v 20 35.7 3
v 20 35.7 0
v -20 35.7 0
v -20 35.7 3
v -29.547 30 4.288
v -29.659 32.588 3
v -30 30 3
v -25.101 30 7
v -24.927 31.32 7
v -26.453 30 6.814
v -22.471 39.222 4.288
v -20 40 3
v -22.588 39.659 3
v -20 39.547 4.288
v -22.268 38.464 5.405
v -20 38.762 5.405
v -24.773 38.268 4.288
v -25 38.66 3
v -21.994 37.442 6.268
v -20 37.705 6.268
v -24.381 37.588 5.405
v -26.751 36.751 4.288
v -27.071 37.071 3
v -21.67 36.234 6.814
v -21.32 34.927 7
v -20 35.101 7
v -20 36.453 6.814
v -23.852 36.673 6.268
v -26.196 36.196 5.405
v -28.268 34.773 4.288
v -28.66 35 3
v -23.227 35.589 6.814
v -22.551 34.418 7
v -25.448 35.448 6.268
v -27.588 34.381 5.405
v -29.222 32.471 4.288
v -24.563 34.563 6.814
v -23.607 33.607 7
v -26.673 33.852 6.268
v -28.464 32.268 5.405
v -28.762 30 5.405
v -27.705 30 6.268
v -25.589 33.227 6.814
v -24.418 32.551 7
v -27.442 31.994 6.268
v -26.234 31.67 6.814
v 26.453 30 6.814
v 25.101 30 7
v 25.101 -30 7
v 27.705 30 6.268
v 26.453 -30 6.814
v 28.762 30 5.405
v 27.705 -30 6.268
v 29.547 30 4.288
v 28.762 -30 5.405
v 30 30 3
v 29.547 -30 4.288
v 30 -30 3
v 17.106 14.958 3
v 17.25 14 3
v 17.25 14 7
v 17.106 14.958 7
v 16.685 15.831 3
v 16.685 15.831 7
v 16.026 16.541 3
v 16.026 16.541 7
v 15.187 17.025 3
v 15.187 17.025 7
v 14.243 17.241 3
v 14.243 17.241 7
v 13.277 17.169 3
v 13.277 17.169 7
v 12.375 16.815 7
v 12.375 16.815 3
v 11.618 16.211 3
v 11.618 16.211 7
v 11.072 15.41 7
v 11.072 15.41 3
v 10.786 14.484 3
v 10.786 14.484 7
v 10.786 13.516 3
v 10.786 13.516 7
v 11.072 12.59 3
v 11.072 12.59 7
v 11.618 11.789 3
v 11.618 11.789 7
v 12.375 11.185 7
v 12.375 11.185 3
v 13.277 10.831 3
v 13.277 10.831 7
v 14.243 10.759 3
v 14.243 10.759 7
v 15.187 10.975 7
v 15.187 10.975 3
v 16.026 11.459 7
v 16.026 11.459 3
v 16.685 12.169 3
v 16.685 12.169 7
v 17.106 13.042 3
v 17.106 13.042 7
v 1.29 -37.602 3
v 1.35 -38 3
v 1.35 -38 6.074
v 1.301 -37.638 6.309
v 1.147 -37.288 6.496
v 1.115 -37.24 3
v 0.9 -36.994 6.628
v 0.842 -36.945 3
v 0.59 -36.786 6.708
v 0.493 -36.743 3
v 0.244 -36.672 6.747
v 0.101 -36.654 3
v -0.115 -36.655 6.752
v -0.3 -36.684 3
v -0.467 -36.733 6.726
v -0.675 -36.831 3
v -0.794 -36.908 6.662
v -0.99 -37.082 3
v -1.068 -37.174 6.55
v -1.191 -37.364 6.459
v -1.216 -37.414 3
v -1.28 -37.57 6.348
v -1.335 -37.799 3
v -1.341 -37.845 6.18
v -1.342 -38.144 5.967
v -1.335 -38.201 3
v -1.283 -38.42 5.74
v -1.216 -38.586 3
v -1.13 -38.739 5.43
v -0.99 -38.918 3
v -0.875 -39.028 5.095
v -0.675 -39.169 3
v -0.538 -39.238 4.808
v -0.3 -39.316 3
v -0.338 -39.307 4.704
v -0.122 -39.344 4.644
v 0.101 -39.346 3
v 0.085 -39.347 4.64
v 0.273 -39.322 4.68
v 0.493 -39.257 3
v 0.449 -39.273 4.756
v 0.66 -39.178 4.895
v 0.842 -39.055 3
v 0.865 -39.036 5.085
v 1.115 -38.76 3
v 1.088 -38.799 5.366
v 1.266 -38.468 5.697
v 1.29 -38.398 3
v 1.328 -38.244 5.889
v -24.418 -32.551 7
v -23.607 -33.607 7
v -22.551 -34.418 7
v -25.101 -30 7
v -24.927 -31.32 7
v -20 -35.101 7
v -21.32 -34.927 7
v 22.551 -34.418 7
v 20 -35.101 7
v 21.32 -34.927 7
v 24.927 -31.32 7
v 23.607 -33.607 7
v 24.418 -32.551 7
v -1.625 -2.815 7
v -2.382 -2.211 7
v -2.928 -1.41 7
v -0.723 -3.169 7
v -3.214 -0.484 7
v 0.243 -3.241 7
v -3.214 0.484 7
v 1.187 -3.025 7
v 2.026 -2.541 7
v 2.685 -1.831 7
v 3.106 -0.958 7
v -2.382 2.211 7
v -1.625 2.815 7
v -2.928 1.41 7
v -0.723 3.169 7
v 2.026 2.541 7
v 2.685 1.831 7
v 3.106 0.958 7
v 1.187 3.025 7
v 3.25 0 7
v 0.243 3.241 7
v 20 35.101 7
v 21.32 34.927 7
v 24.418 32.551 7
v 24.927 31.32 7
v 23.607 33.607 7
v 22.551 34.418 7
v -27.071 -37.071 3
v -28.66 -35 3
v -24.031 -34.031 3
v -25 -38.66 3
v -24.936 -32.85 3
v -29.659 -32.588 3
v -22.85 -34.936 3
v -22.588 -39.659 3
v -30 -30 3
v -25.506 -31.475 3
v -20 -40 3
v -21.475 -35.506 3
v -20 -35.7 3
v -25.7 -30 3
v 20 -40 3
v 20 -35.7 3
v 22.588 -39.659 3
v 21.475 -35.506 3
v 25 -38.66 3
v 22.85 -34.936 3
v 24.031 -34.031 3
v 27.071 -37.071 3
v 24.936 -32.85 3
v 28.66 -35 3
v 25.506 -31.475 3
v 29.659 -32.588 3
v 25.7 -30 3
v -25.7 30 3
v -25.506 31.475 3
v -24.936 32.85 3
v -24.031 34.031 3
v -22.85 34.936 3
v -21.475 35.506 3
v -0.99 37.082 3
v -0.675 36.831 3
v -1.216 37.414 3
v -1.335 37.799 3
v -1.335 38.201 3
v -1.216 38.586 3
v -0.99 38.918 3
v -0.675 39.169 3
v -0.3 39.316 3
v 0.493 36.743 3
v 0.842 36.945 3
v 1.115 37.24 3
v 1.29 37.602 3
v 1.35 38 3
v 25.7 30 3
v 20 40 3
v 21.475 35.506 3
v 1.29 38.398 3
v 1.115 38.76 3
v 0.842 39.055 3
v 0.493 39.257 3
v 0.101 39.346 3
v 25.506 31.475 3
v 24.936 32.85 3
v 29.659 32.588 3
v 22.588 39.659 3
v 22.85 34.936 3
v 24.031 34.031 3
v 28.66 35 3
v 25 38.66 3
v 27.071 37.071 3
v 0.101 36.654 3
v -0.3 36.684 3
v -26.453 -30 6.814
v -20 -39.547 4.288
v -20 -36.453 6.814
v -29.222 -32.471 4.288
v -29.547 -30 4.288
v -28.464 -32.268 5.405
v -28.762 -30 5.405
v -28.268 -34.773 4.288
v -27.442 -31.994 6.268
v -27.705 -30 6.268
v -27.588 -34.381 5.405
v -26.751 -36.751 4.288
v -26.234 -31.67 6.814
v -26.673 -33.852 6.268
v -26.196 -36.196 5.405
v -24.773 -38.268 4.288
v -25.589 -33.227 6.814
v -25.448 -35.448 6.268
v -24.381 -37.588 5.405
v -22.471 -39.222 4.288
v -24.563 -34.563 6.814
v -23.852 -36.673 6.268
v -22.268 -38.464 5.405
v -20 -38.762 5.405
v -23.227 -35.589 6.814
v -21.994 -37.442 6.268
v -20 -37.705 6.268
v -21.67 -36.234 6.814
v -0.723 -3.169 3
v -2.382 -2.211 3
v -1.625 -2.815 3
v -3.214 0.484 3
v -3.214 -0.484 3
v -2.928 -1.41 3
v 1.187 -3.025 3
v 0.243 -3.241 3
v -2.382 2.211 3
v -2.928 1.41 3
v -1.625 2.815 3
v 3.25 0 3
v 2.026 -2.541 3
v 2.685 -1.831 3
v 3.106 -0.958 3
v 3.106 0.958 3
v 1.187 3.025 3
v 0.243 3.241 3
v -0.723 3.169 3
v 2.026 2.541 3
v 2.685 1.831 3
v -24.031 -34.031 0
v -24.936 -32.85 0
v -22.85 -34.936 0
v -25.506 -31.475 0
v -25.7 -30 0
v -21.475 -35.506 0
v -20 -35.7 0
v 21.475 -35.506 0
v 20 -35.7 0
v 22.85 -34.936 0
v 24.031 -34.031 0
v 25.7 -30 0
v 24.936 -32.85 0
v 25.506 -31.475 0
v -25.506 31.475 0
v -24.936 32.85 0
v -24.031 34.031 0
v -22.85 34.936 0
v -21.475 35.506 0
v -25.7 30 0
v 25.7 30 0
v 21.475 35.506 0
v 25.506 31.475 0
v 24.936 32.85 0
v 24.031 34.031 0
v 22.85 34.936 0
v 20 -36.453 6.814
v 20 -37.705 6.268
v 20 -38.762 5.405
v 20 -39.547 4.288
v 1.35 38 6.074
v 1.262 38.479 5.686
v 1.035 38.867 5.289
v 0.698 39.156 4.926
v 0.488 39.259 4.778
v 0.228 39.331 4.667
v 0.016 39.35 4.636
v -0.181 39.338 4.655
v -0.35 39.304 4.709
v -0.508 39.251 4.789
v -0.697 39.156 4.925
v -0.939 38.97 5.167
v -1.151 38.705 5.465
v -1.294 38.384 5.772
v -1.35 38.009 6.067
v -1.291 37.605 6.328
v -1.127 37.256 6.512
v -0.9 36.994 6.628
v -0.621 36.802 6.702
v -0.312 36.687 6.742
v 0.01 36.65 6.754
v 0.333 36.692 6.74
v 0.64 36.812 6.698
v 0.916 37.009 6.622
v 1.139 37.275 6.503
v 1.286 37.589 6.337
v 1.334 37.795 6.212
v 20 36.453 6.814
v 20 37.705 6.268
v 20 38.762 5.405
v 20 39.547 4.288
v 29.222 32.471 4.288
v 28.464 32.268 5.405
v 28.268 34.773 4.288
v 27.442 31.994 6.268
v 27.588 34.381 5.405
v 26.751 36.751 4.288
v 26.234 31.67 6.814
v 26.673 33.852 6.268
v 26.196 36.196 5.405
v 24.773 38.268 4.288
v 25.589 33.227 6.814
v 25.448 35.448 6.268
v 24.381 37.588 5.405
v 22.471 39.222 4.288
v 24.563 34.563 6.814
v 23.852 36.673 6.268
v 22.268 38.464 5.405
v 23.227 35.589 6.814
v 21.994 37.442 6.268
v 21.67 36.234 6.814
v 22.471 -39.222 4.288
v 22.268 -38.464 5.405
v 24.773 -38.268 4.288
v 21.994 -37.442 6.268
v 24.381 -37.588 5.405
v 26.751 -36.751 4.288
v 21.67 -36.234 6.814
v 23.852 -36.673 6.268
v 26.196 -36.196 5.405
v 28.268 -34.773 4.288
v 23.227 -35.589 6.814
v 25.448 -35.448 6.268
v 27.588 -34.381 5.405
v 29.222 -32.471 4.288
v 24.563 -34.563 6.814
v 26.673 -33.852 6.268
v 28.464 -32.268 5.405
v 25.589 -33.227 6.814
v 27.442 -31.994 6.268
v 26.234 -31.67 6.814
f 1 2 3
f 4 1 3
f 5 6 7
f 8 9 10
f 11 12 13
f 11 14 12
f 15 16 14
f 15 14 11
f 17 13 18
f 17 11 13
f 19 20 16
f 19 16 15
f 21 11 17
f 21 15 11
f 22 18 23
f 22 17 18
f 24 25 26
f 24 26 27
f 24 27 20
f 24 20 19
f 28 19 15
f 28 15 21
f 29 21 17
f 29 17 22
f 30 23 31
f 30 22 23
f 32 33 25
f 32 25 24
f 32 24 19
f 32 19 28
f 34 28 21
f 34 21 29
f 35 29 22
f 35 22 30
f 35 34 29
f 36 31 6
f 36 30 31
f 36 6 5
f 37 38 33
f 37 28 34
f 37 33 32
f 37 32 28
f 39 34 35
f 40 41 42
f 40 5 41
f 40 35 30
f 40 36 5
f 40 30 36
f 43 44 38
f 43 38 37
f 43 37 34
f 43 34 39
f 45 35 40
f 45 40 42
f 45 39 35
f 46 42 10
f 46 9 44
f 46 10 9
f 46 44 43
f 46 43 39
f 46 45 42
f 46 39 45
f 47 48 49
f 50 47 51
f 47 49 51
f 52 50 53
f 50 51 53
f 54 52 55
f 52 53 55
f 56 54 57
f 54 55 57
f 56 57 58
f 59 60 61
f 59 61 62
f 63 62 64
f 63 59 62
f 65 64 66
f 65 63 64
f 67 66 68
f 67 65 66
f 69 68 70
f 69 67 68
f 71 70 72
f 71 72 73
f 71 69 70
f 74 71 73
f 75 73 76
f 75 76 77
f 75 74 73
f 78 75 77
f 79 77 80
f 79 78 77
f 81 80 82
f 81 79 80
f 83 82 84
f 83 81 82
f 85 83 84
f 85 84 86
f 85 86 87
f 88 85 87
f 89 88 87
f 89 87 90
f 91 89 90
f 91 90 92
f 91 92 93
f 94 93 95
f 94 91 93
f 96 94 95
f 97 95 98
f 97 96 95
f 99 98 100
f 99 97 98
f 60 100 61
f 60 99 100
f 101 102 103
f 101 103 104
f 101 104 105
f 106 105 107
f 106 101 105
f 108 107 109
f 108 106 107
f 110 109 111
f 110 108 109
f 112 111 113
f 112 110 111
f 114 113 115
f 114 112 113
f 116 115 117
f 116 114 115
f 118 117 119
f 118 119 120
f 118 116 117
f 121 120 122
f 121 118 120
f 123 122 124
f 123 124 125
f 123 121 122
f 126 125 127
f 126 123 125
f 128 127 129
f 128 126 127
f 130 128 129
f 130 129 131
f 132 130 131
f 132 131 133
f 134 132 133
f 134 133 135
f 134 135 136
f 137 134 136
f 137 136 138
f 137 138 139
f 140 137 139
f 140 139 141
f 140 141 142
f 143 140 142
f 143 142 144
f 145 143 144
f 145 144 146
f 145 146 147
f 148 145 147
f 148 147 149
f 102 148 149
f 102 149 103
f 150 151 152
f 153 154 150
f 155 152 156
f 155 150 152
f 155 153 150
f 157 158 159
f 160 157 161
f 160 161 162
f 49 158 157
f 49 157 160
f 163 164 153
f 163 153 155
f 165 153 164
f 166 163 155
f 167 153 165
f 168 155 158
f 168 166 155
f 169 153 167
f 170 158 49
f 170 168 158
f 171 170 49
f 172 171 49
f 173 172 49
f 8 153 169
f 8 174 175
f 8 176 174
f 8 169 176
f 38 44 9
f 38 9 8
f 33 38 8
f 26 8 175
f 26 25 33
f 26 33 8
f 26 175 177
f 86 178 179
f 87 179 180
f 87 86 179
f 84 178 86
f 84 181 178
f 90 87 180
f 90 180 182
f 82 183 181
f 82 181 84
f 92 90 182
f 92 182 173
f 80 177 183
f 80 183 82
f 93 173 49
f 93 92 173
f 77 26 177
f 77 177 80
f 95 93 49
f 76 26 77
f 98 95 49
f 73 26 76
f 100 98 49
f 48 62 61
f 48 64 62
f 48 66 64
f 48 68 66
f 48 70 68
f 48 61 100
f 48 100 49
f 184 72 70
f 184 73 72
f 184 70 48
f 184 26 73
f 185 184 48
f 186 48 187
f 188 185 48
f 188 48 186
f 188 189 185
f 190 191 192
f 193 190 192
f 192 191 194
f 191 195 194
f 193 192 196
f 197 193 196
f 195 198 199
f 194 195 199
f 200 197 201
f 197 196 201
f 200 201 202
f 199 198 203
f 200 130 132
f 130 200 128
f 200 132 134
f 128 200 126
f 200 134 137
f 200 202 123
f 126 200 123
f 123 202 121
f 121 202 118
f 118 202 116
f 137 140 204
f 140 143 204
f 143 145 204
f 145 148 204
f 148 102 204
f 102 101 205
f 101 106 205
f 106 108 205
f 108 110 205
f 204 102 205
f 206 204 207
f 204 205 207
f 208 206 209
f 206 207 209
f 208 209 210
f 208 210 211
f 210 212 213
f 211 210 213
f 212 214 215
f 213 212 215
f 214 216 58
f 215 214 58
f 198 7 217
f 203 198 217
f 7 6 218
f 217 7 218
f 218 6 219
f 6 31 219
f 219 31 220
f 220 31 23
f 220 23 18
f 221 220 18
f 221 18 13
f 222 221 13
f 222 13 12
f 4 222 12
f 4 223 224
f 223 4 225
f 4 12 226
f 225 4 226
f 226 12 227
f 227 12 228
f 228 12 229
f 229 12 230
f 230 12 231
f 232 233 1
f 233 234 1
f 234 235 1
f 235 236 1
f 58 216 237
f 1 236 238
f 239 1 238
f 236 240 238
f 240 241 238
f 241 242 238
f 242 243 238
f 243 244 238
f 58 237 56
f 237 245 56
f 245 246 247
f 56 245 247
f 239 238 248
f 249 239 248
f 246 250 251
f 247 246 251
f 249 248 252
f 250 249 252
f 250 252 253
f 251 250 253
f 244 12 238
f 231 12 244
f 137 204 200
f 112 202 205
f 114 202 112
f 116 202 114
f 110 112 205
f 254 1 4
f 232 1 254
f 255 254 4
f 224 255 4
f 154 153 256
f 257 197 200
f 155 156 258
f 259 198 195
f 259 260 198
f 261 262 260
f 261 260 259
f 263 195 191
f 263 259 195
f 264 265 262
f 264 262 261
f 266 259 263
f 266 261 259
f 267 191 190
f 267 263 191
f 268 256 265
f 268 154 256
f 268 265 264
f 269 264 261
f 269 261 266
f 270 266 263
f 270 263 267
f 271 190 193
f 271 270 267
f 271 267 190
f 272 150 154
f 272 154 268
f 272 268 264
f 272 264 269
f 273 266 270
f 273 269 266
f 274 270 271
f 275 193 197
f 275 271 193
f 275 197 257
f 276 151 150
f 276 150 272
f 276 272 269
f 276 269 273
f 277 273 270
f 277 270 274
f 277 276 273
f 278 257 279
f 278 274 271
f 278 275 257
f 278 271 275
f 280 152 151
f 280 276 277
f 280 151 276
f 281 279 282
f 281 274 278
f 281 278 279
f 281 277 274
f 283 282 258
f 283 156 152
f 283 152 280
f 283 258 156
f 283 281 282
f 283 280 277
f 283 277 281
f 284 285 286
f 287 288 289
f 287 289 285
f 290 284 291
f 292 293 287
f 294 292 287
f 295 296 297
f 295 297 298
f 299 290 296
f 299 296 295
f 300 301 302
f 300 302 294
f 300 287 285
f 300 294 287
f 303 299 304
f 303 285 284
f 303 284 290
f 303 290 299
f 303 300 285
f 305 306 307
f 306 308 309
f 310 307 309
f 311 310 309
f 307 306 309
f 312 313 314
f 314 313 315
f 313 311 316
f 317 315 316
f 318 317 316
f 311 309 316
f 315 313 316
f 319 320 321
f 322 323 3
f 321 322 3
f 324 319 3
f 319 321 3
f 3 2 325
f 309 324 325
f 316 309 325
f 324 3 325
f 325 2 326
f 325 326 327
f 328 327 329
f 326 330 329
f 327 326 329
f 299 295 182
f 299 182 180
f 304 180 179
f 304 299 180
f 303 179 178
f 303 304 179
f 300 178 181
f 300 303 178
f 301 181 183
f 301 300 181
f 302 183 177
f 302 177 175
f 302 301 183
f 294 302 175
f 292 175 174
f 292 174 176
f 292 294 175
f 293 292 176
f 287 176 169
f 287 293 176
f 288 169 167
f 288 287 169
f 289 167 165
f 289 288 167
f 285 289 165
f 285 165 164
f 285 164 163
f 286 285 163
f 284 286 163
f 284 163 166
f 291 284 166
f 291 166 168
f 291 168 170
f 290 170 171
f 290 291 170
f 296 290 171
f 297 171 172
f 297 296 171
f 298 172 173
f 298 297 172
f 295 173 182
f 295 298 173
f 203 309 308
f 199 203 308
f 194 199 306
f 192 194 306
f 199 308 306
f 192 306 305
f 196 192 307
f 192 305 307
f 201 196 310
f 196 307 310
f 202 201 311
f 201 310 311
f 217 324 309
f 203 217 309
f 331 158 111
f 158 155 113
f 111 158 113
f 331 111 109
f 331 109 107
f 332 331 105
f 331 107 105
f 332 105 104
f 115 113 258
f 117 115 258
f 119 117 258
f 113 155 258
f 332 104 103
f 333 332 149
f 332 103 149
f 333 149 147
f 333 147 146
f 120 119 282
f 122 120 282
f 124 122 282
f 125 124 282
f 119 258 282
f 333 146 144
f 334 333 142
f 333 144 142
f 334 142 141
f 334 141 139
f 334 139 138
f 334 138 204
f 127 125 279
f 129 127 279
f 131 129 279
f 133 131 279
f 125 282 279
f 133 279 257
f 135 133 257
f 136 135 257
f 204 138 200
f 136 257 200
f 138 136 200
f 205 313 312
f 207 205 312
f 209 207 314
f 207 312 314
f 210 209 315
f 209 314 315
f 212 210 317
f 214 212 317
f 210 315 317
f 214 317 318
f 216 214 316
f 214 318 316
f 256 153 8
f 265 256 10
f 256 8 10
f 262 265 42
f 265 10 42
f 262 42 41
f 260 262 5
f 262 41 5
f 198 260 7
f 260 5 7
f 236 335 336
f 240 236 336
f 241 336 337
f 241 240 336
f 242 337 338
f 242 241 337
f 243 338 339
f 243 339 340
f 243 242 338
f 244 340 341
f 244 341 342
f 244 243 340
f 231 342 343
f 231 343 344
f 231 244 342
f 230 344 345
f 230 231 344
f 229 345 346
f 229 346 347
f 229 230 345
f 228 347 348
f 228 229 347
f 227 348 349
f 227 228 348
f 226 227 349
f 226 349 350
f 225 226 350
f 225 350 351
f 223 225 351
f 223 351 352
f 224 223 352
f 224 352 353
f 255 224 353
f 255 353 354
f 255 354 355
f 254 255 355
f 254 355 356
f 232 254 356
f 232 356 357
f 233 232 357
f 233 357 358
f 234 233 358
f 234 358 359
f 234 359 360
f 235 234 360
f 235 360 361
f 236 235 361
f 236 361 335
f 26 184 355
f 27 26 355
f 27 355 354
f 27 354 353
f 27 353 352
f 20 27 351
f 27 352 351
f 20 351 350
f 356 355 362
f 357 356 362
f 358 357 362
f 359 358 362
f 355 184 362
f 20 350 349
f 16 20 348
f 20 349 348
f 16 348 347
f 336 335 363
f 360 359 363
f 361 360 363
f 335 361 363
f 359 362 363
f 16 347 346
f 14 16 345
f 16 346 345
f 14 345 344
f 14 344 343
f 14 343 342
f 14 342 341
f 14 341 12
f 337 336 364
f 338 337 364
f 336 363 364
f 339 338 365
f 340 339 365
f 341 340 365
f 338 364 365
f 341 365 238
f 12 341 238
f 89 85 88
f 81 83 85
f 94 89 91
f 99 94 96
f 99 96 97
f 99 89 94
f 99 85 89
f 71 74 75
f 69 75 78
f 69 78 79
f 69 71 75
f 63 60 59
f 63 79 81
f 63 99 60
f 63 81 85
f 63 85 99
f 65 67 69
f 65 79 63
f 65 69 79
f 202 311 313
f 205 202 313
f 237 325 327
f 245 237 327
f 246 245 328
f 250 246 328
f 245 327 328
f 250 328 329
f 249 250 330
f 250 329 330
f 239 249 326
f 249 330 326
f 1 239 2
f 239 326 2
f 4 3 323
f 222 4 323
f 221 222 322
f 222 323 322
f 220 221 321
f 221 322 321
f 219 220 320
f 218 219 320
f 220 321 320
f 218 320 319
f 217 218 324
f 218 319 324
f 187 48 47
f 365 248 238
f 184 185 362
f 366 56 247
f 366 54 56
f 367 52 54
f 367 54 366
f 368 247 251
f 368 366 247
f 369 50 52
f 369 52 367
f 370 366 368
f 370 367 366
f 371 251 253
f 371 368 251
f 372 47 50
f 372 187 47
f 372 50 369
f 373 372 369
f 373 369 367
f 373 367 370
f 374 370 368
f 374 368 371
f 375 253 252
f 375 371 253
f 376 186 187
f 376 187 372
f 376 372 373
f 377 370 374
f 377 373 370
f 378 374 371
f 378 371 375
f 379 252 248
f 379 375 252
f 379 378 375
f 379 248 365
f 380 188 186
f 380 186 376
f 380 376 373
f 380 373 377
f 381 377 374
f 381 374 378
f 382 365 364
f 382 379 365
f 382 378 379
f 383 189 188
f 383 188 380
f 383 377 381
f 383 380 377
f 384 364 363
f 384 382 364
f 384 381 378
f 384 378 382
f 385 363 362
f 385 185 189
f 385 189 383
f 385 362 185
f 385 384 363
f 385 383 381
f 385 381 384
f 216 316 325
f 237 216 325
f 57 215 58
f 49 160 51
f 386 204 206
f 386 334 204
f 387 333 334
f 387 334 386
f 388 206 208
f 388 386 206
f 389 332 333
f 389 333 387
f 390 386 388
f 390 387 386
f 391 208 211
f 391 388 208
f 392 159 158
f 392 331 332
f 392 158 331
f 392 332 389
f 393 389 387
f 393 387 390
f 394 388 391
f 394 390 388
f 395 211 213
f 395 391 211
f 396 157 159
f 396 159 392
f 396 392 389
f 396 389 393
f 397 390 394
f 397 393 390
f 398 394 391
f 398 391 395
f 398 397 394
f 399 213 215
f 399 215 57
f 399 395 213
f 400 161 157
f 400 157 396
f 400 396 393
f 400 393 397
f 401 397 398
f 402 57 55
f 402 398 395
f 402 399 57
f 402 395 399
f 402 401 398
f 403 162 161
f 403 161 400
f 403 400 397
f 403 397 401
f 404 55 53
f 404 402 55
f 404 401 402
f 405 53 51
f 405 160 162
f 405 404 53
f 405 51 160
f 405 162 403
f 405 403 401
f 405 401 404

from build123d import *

# Parameters (mm, degrees)
EXTRUDE_1_DEPTH = 3
EXTRUDE_START   = 3
SKETCH_2_R      = 1.35
SKETCH_2_R_2    = 3.25
EXTRUDE_2_DEPTH = 4
FILLET_1_R      = 5


with BuildPart() as part:
    # 草圖1 → 填料-伸長1 (new body)
    with BuildSketch(Plane.XY):
        with BuildLine():
            Line((25.7, -30), (25.7, 30))
            ThreePointArc((25.7, 30), (24.030508653, 34.030508653), (20, 35.7))
            Line((20, 35.7), (-20, 35.7))
            ThreePointArc((-20, 35.7), (-24.030508653, 34.030508653), (-25.7, 30))
            Line((-25.7, 30), (-25.7, -30))
            ThreePointArc((-25.7, -30), (-24.030508653, -34.030508653), (-20, -35.7))
            Line((-20, -35.7), (20, -35.7))
            ThreePointArc((20, -35.7), (24.030508653, -34.030508653), (25.7, -30))
        make_face()
    extrude(amount=EXTRUDE_1_DEPTH)

    # 草圖2 → 填料-伸長2 (add)
    with BuildSketch(Plane.XY.offset(EXTRUDE_START)):
        with BuildLine():
            Line((30, -30), (30, 30))
            ThreePointArc((30, 30), (27.071067812, 37.071067812), (20, 40))
            Line((20, 40), (-20, 40))
            ThreePointArc((-20, 40), (-27.071067812, 37.071067812), (-30, 30))
            Line((-30, 30), (-30, -30))
            ThreePointArc((-30, -30), (-27.071067812, -37.071067812), (-20, -40))
            Line((-20, -40), (20, -40))
            ThreePointArc((20, -40), (27.071067812, -37.071067812), (30, -30))
        make_face()
        with Locations((0, 38)):
            Circle(SKETCH_2_R, mode=Mode.SUBTRACT)
        with Locations((0, -38)):
            Circle(SKETCH_2_R, mode=Mode.SUBTRACT)
        Circle(SKETCH_2_R_2, mode=Mode.SUBTRACT)
        with Locations((14, 14)):
            Circle(SKETCH_2_R_2, mode=Mode.SUBTRACT)
    extrude(amount=EXTRUDE_2_DEPTH)

    # 圓角1
    # the kernel refuses this fillet: 5 mm, written as the material it takes off along each edge
    with BuildSketch(Plane(origin=(20, -30, 7), x_dir=(0, -1, 0), z_dir=(-1, 0, 0))) as fillet_1_piece_1:
        with BuildLine():
            CenterArc((5.101020514, -5), FILLET_1_R, 11.536959033, 78.463040967)
            Line((5.101020514, 0), (5.101020514, 0.1))
            Line((5.101020514, 0.1), (10, 0.1))
            Line((10, 0.1), (10.1, 0))
            ThreePointArc((10.1, 0), (10.1, -2), (10.09797959, -3.98))
            Line((10.09797959, -3.98), (10, -4))
        make_face()
    revolve(axis=Axis((20, -30, 7), (0, 0, 1)), revolution_arc=90, mode=Mode.SUBTRACT)
    with BuildSketch(Plane(origin=(30, -30, 7), x_dir=(-1.5640821970914211e-12, 0, -1.0), z_dir=(0, 1, 0)), Plane(origin=(-30, 30, 7), x_dir=(1.5640821970914211e-12, 0, -1.0), z_dir=(0, -1, 0))) as fillet_1_piece_2:
        with BuildLine():
            CenterArc((5, 4.898979486), FILLET_1_R, 180, 78.463040967)
            Line((0, 4.898979486), (-0.1, 4.898979486))
            Line((-0.1, 4.898979486), (-0.1, 0))
            Line((-0.1, 0), (0, -0.1))
            ThreePointArc((0, -0.1), (2, -0.1), (3.98, -0.09797959))
            Line((3.98, -0.09797959), (4, 0))
        make_face()
    extrude(amount=60, mode=Mode.SUBTRACT)
    with BuildSketch(Plane(origin=(20, 30, 7), x_dir=(1, 0, 0), z_dir=(0, -1, 0))) as fillet_1_piece_3:
        with BuildLine():
            CenterArc((5.101020514, -5), FILLET_1_R, 11.536959033, 78.463040967)
            Line((5.101020514, 0), (5.101020514, 0.1))
            Line((5.101020514, 0.1), (10, 0.1))
            Line((10, 0.1), (10.1, 0))
            ThreePointArc((10.1, 0), (10.1, -2), (10.09797959, -3.98))
            Line((10.09797959, -3.98), (10, -4))
        make_face()
    revolve(axis=Axis((20, 30, 7), (0, 0, 1)), revolution_arc=90, mode=Mode.SUBTRACT)
    with BuildSketch(Plane(origin=(20, 40, 7), x_dir=(0, -1.5667467323505197e-12, -1.0), z_dir=(-1, 0, 0)), Plane(origin=(-20, -40, 7), x_dir=(0, 1.5667467323505197e-12, -1.0), z_dir=(1, 0, 0))) as fillet_1_piece_4:
        with BuildLine():
            CenterArc((5, 4.898979486), FILLET_1_R, 180, 78.463040967)
            Line((0, 4.898979486), (-0.1, 4.898979486))
            Line((-0.1, 4.898979486), (-0.1, 0))
            Line((-0.1, 0), (0, -0.1))
            ThreePointArc((0, -0.1), (2, -0.1), (3.98, -0.09797959))
            Line((3.98, -0.09797959), (4, 0))
        make_face()
    extrude(amount=40, mode=Mode.SUBTRACT)
    with BuildSketch(Plane(origin=(-20, 30, 7), x_dir=(0, 1, 0), z_dir=(1, 0, 0))) as fillet_1_piece_5:
        with BuildLine():
            CenterArc((5.101020514, -5), FILLET_1_R, 11.536959033, 78.463040967)
            Line((5.101020514, 0), (5.101020514, 0.1))
            Line((5.101020514, 0.1), (10, 0.1))
            Line((10, 0.1), (10.1, 0))
            ThreePointArc((10.1, 0), (10.1, -2), (10.09797959, -3.98))
            Line((10.09797959, -3.98), (10, -4))
        make_face()
    revolve(axis=Axis((-20, 30, 7), (0, 0, 1)), revolution_arc=90, mode=Mode.SUBTRACT)
    with BuildSketch(Plane(origin=(-20, -30, 7), x_dir=(-1, 0, 0), z_dir=(0, 1, 0))) as fillet_1_piece_6:
        with BuildLine():
            CenterArc((5.101020514, -5), FILLET_1_R, 11.536959033, 78.463040967)
            Line((5.101020514, 0), (5.101020514, 0.1))
            Line((5.101020514, 0.1), (10, 0.1))
            Line((10, 0.1), (10.1, 0))
            ThreePointArc((10.1, 0), (10.1, -2), (10.09797959, -3.98))
            Line((10.09797959, -3.98), (10, -4))
        make_face()
    revolve(axis=Axis((-20, -30, 7), (0, 0, 1)), revolution_arc=90, mode=Mode.SUBTRACT)


solid = part.part
